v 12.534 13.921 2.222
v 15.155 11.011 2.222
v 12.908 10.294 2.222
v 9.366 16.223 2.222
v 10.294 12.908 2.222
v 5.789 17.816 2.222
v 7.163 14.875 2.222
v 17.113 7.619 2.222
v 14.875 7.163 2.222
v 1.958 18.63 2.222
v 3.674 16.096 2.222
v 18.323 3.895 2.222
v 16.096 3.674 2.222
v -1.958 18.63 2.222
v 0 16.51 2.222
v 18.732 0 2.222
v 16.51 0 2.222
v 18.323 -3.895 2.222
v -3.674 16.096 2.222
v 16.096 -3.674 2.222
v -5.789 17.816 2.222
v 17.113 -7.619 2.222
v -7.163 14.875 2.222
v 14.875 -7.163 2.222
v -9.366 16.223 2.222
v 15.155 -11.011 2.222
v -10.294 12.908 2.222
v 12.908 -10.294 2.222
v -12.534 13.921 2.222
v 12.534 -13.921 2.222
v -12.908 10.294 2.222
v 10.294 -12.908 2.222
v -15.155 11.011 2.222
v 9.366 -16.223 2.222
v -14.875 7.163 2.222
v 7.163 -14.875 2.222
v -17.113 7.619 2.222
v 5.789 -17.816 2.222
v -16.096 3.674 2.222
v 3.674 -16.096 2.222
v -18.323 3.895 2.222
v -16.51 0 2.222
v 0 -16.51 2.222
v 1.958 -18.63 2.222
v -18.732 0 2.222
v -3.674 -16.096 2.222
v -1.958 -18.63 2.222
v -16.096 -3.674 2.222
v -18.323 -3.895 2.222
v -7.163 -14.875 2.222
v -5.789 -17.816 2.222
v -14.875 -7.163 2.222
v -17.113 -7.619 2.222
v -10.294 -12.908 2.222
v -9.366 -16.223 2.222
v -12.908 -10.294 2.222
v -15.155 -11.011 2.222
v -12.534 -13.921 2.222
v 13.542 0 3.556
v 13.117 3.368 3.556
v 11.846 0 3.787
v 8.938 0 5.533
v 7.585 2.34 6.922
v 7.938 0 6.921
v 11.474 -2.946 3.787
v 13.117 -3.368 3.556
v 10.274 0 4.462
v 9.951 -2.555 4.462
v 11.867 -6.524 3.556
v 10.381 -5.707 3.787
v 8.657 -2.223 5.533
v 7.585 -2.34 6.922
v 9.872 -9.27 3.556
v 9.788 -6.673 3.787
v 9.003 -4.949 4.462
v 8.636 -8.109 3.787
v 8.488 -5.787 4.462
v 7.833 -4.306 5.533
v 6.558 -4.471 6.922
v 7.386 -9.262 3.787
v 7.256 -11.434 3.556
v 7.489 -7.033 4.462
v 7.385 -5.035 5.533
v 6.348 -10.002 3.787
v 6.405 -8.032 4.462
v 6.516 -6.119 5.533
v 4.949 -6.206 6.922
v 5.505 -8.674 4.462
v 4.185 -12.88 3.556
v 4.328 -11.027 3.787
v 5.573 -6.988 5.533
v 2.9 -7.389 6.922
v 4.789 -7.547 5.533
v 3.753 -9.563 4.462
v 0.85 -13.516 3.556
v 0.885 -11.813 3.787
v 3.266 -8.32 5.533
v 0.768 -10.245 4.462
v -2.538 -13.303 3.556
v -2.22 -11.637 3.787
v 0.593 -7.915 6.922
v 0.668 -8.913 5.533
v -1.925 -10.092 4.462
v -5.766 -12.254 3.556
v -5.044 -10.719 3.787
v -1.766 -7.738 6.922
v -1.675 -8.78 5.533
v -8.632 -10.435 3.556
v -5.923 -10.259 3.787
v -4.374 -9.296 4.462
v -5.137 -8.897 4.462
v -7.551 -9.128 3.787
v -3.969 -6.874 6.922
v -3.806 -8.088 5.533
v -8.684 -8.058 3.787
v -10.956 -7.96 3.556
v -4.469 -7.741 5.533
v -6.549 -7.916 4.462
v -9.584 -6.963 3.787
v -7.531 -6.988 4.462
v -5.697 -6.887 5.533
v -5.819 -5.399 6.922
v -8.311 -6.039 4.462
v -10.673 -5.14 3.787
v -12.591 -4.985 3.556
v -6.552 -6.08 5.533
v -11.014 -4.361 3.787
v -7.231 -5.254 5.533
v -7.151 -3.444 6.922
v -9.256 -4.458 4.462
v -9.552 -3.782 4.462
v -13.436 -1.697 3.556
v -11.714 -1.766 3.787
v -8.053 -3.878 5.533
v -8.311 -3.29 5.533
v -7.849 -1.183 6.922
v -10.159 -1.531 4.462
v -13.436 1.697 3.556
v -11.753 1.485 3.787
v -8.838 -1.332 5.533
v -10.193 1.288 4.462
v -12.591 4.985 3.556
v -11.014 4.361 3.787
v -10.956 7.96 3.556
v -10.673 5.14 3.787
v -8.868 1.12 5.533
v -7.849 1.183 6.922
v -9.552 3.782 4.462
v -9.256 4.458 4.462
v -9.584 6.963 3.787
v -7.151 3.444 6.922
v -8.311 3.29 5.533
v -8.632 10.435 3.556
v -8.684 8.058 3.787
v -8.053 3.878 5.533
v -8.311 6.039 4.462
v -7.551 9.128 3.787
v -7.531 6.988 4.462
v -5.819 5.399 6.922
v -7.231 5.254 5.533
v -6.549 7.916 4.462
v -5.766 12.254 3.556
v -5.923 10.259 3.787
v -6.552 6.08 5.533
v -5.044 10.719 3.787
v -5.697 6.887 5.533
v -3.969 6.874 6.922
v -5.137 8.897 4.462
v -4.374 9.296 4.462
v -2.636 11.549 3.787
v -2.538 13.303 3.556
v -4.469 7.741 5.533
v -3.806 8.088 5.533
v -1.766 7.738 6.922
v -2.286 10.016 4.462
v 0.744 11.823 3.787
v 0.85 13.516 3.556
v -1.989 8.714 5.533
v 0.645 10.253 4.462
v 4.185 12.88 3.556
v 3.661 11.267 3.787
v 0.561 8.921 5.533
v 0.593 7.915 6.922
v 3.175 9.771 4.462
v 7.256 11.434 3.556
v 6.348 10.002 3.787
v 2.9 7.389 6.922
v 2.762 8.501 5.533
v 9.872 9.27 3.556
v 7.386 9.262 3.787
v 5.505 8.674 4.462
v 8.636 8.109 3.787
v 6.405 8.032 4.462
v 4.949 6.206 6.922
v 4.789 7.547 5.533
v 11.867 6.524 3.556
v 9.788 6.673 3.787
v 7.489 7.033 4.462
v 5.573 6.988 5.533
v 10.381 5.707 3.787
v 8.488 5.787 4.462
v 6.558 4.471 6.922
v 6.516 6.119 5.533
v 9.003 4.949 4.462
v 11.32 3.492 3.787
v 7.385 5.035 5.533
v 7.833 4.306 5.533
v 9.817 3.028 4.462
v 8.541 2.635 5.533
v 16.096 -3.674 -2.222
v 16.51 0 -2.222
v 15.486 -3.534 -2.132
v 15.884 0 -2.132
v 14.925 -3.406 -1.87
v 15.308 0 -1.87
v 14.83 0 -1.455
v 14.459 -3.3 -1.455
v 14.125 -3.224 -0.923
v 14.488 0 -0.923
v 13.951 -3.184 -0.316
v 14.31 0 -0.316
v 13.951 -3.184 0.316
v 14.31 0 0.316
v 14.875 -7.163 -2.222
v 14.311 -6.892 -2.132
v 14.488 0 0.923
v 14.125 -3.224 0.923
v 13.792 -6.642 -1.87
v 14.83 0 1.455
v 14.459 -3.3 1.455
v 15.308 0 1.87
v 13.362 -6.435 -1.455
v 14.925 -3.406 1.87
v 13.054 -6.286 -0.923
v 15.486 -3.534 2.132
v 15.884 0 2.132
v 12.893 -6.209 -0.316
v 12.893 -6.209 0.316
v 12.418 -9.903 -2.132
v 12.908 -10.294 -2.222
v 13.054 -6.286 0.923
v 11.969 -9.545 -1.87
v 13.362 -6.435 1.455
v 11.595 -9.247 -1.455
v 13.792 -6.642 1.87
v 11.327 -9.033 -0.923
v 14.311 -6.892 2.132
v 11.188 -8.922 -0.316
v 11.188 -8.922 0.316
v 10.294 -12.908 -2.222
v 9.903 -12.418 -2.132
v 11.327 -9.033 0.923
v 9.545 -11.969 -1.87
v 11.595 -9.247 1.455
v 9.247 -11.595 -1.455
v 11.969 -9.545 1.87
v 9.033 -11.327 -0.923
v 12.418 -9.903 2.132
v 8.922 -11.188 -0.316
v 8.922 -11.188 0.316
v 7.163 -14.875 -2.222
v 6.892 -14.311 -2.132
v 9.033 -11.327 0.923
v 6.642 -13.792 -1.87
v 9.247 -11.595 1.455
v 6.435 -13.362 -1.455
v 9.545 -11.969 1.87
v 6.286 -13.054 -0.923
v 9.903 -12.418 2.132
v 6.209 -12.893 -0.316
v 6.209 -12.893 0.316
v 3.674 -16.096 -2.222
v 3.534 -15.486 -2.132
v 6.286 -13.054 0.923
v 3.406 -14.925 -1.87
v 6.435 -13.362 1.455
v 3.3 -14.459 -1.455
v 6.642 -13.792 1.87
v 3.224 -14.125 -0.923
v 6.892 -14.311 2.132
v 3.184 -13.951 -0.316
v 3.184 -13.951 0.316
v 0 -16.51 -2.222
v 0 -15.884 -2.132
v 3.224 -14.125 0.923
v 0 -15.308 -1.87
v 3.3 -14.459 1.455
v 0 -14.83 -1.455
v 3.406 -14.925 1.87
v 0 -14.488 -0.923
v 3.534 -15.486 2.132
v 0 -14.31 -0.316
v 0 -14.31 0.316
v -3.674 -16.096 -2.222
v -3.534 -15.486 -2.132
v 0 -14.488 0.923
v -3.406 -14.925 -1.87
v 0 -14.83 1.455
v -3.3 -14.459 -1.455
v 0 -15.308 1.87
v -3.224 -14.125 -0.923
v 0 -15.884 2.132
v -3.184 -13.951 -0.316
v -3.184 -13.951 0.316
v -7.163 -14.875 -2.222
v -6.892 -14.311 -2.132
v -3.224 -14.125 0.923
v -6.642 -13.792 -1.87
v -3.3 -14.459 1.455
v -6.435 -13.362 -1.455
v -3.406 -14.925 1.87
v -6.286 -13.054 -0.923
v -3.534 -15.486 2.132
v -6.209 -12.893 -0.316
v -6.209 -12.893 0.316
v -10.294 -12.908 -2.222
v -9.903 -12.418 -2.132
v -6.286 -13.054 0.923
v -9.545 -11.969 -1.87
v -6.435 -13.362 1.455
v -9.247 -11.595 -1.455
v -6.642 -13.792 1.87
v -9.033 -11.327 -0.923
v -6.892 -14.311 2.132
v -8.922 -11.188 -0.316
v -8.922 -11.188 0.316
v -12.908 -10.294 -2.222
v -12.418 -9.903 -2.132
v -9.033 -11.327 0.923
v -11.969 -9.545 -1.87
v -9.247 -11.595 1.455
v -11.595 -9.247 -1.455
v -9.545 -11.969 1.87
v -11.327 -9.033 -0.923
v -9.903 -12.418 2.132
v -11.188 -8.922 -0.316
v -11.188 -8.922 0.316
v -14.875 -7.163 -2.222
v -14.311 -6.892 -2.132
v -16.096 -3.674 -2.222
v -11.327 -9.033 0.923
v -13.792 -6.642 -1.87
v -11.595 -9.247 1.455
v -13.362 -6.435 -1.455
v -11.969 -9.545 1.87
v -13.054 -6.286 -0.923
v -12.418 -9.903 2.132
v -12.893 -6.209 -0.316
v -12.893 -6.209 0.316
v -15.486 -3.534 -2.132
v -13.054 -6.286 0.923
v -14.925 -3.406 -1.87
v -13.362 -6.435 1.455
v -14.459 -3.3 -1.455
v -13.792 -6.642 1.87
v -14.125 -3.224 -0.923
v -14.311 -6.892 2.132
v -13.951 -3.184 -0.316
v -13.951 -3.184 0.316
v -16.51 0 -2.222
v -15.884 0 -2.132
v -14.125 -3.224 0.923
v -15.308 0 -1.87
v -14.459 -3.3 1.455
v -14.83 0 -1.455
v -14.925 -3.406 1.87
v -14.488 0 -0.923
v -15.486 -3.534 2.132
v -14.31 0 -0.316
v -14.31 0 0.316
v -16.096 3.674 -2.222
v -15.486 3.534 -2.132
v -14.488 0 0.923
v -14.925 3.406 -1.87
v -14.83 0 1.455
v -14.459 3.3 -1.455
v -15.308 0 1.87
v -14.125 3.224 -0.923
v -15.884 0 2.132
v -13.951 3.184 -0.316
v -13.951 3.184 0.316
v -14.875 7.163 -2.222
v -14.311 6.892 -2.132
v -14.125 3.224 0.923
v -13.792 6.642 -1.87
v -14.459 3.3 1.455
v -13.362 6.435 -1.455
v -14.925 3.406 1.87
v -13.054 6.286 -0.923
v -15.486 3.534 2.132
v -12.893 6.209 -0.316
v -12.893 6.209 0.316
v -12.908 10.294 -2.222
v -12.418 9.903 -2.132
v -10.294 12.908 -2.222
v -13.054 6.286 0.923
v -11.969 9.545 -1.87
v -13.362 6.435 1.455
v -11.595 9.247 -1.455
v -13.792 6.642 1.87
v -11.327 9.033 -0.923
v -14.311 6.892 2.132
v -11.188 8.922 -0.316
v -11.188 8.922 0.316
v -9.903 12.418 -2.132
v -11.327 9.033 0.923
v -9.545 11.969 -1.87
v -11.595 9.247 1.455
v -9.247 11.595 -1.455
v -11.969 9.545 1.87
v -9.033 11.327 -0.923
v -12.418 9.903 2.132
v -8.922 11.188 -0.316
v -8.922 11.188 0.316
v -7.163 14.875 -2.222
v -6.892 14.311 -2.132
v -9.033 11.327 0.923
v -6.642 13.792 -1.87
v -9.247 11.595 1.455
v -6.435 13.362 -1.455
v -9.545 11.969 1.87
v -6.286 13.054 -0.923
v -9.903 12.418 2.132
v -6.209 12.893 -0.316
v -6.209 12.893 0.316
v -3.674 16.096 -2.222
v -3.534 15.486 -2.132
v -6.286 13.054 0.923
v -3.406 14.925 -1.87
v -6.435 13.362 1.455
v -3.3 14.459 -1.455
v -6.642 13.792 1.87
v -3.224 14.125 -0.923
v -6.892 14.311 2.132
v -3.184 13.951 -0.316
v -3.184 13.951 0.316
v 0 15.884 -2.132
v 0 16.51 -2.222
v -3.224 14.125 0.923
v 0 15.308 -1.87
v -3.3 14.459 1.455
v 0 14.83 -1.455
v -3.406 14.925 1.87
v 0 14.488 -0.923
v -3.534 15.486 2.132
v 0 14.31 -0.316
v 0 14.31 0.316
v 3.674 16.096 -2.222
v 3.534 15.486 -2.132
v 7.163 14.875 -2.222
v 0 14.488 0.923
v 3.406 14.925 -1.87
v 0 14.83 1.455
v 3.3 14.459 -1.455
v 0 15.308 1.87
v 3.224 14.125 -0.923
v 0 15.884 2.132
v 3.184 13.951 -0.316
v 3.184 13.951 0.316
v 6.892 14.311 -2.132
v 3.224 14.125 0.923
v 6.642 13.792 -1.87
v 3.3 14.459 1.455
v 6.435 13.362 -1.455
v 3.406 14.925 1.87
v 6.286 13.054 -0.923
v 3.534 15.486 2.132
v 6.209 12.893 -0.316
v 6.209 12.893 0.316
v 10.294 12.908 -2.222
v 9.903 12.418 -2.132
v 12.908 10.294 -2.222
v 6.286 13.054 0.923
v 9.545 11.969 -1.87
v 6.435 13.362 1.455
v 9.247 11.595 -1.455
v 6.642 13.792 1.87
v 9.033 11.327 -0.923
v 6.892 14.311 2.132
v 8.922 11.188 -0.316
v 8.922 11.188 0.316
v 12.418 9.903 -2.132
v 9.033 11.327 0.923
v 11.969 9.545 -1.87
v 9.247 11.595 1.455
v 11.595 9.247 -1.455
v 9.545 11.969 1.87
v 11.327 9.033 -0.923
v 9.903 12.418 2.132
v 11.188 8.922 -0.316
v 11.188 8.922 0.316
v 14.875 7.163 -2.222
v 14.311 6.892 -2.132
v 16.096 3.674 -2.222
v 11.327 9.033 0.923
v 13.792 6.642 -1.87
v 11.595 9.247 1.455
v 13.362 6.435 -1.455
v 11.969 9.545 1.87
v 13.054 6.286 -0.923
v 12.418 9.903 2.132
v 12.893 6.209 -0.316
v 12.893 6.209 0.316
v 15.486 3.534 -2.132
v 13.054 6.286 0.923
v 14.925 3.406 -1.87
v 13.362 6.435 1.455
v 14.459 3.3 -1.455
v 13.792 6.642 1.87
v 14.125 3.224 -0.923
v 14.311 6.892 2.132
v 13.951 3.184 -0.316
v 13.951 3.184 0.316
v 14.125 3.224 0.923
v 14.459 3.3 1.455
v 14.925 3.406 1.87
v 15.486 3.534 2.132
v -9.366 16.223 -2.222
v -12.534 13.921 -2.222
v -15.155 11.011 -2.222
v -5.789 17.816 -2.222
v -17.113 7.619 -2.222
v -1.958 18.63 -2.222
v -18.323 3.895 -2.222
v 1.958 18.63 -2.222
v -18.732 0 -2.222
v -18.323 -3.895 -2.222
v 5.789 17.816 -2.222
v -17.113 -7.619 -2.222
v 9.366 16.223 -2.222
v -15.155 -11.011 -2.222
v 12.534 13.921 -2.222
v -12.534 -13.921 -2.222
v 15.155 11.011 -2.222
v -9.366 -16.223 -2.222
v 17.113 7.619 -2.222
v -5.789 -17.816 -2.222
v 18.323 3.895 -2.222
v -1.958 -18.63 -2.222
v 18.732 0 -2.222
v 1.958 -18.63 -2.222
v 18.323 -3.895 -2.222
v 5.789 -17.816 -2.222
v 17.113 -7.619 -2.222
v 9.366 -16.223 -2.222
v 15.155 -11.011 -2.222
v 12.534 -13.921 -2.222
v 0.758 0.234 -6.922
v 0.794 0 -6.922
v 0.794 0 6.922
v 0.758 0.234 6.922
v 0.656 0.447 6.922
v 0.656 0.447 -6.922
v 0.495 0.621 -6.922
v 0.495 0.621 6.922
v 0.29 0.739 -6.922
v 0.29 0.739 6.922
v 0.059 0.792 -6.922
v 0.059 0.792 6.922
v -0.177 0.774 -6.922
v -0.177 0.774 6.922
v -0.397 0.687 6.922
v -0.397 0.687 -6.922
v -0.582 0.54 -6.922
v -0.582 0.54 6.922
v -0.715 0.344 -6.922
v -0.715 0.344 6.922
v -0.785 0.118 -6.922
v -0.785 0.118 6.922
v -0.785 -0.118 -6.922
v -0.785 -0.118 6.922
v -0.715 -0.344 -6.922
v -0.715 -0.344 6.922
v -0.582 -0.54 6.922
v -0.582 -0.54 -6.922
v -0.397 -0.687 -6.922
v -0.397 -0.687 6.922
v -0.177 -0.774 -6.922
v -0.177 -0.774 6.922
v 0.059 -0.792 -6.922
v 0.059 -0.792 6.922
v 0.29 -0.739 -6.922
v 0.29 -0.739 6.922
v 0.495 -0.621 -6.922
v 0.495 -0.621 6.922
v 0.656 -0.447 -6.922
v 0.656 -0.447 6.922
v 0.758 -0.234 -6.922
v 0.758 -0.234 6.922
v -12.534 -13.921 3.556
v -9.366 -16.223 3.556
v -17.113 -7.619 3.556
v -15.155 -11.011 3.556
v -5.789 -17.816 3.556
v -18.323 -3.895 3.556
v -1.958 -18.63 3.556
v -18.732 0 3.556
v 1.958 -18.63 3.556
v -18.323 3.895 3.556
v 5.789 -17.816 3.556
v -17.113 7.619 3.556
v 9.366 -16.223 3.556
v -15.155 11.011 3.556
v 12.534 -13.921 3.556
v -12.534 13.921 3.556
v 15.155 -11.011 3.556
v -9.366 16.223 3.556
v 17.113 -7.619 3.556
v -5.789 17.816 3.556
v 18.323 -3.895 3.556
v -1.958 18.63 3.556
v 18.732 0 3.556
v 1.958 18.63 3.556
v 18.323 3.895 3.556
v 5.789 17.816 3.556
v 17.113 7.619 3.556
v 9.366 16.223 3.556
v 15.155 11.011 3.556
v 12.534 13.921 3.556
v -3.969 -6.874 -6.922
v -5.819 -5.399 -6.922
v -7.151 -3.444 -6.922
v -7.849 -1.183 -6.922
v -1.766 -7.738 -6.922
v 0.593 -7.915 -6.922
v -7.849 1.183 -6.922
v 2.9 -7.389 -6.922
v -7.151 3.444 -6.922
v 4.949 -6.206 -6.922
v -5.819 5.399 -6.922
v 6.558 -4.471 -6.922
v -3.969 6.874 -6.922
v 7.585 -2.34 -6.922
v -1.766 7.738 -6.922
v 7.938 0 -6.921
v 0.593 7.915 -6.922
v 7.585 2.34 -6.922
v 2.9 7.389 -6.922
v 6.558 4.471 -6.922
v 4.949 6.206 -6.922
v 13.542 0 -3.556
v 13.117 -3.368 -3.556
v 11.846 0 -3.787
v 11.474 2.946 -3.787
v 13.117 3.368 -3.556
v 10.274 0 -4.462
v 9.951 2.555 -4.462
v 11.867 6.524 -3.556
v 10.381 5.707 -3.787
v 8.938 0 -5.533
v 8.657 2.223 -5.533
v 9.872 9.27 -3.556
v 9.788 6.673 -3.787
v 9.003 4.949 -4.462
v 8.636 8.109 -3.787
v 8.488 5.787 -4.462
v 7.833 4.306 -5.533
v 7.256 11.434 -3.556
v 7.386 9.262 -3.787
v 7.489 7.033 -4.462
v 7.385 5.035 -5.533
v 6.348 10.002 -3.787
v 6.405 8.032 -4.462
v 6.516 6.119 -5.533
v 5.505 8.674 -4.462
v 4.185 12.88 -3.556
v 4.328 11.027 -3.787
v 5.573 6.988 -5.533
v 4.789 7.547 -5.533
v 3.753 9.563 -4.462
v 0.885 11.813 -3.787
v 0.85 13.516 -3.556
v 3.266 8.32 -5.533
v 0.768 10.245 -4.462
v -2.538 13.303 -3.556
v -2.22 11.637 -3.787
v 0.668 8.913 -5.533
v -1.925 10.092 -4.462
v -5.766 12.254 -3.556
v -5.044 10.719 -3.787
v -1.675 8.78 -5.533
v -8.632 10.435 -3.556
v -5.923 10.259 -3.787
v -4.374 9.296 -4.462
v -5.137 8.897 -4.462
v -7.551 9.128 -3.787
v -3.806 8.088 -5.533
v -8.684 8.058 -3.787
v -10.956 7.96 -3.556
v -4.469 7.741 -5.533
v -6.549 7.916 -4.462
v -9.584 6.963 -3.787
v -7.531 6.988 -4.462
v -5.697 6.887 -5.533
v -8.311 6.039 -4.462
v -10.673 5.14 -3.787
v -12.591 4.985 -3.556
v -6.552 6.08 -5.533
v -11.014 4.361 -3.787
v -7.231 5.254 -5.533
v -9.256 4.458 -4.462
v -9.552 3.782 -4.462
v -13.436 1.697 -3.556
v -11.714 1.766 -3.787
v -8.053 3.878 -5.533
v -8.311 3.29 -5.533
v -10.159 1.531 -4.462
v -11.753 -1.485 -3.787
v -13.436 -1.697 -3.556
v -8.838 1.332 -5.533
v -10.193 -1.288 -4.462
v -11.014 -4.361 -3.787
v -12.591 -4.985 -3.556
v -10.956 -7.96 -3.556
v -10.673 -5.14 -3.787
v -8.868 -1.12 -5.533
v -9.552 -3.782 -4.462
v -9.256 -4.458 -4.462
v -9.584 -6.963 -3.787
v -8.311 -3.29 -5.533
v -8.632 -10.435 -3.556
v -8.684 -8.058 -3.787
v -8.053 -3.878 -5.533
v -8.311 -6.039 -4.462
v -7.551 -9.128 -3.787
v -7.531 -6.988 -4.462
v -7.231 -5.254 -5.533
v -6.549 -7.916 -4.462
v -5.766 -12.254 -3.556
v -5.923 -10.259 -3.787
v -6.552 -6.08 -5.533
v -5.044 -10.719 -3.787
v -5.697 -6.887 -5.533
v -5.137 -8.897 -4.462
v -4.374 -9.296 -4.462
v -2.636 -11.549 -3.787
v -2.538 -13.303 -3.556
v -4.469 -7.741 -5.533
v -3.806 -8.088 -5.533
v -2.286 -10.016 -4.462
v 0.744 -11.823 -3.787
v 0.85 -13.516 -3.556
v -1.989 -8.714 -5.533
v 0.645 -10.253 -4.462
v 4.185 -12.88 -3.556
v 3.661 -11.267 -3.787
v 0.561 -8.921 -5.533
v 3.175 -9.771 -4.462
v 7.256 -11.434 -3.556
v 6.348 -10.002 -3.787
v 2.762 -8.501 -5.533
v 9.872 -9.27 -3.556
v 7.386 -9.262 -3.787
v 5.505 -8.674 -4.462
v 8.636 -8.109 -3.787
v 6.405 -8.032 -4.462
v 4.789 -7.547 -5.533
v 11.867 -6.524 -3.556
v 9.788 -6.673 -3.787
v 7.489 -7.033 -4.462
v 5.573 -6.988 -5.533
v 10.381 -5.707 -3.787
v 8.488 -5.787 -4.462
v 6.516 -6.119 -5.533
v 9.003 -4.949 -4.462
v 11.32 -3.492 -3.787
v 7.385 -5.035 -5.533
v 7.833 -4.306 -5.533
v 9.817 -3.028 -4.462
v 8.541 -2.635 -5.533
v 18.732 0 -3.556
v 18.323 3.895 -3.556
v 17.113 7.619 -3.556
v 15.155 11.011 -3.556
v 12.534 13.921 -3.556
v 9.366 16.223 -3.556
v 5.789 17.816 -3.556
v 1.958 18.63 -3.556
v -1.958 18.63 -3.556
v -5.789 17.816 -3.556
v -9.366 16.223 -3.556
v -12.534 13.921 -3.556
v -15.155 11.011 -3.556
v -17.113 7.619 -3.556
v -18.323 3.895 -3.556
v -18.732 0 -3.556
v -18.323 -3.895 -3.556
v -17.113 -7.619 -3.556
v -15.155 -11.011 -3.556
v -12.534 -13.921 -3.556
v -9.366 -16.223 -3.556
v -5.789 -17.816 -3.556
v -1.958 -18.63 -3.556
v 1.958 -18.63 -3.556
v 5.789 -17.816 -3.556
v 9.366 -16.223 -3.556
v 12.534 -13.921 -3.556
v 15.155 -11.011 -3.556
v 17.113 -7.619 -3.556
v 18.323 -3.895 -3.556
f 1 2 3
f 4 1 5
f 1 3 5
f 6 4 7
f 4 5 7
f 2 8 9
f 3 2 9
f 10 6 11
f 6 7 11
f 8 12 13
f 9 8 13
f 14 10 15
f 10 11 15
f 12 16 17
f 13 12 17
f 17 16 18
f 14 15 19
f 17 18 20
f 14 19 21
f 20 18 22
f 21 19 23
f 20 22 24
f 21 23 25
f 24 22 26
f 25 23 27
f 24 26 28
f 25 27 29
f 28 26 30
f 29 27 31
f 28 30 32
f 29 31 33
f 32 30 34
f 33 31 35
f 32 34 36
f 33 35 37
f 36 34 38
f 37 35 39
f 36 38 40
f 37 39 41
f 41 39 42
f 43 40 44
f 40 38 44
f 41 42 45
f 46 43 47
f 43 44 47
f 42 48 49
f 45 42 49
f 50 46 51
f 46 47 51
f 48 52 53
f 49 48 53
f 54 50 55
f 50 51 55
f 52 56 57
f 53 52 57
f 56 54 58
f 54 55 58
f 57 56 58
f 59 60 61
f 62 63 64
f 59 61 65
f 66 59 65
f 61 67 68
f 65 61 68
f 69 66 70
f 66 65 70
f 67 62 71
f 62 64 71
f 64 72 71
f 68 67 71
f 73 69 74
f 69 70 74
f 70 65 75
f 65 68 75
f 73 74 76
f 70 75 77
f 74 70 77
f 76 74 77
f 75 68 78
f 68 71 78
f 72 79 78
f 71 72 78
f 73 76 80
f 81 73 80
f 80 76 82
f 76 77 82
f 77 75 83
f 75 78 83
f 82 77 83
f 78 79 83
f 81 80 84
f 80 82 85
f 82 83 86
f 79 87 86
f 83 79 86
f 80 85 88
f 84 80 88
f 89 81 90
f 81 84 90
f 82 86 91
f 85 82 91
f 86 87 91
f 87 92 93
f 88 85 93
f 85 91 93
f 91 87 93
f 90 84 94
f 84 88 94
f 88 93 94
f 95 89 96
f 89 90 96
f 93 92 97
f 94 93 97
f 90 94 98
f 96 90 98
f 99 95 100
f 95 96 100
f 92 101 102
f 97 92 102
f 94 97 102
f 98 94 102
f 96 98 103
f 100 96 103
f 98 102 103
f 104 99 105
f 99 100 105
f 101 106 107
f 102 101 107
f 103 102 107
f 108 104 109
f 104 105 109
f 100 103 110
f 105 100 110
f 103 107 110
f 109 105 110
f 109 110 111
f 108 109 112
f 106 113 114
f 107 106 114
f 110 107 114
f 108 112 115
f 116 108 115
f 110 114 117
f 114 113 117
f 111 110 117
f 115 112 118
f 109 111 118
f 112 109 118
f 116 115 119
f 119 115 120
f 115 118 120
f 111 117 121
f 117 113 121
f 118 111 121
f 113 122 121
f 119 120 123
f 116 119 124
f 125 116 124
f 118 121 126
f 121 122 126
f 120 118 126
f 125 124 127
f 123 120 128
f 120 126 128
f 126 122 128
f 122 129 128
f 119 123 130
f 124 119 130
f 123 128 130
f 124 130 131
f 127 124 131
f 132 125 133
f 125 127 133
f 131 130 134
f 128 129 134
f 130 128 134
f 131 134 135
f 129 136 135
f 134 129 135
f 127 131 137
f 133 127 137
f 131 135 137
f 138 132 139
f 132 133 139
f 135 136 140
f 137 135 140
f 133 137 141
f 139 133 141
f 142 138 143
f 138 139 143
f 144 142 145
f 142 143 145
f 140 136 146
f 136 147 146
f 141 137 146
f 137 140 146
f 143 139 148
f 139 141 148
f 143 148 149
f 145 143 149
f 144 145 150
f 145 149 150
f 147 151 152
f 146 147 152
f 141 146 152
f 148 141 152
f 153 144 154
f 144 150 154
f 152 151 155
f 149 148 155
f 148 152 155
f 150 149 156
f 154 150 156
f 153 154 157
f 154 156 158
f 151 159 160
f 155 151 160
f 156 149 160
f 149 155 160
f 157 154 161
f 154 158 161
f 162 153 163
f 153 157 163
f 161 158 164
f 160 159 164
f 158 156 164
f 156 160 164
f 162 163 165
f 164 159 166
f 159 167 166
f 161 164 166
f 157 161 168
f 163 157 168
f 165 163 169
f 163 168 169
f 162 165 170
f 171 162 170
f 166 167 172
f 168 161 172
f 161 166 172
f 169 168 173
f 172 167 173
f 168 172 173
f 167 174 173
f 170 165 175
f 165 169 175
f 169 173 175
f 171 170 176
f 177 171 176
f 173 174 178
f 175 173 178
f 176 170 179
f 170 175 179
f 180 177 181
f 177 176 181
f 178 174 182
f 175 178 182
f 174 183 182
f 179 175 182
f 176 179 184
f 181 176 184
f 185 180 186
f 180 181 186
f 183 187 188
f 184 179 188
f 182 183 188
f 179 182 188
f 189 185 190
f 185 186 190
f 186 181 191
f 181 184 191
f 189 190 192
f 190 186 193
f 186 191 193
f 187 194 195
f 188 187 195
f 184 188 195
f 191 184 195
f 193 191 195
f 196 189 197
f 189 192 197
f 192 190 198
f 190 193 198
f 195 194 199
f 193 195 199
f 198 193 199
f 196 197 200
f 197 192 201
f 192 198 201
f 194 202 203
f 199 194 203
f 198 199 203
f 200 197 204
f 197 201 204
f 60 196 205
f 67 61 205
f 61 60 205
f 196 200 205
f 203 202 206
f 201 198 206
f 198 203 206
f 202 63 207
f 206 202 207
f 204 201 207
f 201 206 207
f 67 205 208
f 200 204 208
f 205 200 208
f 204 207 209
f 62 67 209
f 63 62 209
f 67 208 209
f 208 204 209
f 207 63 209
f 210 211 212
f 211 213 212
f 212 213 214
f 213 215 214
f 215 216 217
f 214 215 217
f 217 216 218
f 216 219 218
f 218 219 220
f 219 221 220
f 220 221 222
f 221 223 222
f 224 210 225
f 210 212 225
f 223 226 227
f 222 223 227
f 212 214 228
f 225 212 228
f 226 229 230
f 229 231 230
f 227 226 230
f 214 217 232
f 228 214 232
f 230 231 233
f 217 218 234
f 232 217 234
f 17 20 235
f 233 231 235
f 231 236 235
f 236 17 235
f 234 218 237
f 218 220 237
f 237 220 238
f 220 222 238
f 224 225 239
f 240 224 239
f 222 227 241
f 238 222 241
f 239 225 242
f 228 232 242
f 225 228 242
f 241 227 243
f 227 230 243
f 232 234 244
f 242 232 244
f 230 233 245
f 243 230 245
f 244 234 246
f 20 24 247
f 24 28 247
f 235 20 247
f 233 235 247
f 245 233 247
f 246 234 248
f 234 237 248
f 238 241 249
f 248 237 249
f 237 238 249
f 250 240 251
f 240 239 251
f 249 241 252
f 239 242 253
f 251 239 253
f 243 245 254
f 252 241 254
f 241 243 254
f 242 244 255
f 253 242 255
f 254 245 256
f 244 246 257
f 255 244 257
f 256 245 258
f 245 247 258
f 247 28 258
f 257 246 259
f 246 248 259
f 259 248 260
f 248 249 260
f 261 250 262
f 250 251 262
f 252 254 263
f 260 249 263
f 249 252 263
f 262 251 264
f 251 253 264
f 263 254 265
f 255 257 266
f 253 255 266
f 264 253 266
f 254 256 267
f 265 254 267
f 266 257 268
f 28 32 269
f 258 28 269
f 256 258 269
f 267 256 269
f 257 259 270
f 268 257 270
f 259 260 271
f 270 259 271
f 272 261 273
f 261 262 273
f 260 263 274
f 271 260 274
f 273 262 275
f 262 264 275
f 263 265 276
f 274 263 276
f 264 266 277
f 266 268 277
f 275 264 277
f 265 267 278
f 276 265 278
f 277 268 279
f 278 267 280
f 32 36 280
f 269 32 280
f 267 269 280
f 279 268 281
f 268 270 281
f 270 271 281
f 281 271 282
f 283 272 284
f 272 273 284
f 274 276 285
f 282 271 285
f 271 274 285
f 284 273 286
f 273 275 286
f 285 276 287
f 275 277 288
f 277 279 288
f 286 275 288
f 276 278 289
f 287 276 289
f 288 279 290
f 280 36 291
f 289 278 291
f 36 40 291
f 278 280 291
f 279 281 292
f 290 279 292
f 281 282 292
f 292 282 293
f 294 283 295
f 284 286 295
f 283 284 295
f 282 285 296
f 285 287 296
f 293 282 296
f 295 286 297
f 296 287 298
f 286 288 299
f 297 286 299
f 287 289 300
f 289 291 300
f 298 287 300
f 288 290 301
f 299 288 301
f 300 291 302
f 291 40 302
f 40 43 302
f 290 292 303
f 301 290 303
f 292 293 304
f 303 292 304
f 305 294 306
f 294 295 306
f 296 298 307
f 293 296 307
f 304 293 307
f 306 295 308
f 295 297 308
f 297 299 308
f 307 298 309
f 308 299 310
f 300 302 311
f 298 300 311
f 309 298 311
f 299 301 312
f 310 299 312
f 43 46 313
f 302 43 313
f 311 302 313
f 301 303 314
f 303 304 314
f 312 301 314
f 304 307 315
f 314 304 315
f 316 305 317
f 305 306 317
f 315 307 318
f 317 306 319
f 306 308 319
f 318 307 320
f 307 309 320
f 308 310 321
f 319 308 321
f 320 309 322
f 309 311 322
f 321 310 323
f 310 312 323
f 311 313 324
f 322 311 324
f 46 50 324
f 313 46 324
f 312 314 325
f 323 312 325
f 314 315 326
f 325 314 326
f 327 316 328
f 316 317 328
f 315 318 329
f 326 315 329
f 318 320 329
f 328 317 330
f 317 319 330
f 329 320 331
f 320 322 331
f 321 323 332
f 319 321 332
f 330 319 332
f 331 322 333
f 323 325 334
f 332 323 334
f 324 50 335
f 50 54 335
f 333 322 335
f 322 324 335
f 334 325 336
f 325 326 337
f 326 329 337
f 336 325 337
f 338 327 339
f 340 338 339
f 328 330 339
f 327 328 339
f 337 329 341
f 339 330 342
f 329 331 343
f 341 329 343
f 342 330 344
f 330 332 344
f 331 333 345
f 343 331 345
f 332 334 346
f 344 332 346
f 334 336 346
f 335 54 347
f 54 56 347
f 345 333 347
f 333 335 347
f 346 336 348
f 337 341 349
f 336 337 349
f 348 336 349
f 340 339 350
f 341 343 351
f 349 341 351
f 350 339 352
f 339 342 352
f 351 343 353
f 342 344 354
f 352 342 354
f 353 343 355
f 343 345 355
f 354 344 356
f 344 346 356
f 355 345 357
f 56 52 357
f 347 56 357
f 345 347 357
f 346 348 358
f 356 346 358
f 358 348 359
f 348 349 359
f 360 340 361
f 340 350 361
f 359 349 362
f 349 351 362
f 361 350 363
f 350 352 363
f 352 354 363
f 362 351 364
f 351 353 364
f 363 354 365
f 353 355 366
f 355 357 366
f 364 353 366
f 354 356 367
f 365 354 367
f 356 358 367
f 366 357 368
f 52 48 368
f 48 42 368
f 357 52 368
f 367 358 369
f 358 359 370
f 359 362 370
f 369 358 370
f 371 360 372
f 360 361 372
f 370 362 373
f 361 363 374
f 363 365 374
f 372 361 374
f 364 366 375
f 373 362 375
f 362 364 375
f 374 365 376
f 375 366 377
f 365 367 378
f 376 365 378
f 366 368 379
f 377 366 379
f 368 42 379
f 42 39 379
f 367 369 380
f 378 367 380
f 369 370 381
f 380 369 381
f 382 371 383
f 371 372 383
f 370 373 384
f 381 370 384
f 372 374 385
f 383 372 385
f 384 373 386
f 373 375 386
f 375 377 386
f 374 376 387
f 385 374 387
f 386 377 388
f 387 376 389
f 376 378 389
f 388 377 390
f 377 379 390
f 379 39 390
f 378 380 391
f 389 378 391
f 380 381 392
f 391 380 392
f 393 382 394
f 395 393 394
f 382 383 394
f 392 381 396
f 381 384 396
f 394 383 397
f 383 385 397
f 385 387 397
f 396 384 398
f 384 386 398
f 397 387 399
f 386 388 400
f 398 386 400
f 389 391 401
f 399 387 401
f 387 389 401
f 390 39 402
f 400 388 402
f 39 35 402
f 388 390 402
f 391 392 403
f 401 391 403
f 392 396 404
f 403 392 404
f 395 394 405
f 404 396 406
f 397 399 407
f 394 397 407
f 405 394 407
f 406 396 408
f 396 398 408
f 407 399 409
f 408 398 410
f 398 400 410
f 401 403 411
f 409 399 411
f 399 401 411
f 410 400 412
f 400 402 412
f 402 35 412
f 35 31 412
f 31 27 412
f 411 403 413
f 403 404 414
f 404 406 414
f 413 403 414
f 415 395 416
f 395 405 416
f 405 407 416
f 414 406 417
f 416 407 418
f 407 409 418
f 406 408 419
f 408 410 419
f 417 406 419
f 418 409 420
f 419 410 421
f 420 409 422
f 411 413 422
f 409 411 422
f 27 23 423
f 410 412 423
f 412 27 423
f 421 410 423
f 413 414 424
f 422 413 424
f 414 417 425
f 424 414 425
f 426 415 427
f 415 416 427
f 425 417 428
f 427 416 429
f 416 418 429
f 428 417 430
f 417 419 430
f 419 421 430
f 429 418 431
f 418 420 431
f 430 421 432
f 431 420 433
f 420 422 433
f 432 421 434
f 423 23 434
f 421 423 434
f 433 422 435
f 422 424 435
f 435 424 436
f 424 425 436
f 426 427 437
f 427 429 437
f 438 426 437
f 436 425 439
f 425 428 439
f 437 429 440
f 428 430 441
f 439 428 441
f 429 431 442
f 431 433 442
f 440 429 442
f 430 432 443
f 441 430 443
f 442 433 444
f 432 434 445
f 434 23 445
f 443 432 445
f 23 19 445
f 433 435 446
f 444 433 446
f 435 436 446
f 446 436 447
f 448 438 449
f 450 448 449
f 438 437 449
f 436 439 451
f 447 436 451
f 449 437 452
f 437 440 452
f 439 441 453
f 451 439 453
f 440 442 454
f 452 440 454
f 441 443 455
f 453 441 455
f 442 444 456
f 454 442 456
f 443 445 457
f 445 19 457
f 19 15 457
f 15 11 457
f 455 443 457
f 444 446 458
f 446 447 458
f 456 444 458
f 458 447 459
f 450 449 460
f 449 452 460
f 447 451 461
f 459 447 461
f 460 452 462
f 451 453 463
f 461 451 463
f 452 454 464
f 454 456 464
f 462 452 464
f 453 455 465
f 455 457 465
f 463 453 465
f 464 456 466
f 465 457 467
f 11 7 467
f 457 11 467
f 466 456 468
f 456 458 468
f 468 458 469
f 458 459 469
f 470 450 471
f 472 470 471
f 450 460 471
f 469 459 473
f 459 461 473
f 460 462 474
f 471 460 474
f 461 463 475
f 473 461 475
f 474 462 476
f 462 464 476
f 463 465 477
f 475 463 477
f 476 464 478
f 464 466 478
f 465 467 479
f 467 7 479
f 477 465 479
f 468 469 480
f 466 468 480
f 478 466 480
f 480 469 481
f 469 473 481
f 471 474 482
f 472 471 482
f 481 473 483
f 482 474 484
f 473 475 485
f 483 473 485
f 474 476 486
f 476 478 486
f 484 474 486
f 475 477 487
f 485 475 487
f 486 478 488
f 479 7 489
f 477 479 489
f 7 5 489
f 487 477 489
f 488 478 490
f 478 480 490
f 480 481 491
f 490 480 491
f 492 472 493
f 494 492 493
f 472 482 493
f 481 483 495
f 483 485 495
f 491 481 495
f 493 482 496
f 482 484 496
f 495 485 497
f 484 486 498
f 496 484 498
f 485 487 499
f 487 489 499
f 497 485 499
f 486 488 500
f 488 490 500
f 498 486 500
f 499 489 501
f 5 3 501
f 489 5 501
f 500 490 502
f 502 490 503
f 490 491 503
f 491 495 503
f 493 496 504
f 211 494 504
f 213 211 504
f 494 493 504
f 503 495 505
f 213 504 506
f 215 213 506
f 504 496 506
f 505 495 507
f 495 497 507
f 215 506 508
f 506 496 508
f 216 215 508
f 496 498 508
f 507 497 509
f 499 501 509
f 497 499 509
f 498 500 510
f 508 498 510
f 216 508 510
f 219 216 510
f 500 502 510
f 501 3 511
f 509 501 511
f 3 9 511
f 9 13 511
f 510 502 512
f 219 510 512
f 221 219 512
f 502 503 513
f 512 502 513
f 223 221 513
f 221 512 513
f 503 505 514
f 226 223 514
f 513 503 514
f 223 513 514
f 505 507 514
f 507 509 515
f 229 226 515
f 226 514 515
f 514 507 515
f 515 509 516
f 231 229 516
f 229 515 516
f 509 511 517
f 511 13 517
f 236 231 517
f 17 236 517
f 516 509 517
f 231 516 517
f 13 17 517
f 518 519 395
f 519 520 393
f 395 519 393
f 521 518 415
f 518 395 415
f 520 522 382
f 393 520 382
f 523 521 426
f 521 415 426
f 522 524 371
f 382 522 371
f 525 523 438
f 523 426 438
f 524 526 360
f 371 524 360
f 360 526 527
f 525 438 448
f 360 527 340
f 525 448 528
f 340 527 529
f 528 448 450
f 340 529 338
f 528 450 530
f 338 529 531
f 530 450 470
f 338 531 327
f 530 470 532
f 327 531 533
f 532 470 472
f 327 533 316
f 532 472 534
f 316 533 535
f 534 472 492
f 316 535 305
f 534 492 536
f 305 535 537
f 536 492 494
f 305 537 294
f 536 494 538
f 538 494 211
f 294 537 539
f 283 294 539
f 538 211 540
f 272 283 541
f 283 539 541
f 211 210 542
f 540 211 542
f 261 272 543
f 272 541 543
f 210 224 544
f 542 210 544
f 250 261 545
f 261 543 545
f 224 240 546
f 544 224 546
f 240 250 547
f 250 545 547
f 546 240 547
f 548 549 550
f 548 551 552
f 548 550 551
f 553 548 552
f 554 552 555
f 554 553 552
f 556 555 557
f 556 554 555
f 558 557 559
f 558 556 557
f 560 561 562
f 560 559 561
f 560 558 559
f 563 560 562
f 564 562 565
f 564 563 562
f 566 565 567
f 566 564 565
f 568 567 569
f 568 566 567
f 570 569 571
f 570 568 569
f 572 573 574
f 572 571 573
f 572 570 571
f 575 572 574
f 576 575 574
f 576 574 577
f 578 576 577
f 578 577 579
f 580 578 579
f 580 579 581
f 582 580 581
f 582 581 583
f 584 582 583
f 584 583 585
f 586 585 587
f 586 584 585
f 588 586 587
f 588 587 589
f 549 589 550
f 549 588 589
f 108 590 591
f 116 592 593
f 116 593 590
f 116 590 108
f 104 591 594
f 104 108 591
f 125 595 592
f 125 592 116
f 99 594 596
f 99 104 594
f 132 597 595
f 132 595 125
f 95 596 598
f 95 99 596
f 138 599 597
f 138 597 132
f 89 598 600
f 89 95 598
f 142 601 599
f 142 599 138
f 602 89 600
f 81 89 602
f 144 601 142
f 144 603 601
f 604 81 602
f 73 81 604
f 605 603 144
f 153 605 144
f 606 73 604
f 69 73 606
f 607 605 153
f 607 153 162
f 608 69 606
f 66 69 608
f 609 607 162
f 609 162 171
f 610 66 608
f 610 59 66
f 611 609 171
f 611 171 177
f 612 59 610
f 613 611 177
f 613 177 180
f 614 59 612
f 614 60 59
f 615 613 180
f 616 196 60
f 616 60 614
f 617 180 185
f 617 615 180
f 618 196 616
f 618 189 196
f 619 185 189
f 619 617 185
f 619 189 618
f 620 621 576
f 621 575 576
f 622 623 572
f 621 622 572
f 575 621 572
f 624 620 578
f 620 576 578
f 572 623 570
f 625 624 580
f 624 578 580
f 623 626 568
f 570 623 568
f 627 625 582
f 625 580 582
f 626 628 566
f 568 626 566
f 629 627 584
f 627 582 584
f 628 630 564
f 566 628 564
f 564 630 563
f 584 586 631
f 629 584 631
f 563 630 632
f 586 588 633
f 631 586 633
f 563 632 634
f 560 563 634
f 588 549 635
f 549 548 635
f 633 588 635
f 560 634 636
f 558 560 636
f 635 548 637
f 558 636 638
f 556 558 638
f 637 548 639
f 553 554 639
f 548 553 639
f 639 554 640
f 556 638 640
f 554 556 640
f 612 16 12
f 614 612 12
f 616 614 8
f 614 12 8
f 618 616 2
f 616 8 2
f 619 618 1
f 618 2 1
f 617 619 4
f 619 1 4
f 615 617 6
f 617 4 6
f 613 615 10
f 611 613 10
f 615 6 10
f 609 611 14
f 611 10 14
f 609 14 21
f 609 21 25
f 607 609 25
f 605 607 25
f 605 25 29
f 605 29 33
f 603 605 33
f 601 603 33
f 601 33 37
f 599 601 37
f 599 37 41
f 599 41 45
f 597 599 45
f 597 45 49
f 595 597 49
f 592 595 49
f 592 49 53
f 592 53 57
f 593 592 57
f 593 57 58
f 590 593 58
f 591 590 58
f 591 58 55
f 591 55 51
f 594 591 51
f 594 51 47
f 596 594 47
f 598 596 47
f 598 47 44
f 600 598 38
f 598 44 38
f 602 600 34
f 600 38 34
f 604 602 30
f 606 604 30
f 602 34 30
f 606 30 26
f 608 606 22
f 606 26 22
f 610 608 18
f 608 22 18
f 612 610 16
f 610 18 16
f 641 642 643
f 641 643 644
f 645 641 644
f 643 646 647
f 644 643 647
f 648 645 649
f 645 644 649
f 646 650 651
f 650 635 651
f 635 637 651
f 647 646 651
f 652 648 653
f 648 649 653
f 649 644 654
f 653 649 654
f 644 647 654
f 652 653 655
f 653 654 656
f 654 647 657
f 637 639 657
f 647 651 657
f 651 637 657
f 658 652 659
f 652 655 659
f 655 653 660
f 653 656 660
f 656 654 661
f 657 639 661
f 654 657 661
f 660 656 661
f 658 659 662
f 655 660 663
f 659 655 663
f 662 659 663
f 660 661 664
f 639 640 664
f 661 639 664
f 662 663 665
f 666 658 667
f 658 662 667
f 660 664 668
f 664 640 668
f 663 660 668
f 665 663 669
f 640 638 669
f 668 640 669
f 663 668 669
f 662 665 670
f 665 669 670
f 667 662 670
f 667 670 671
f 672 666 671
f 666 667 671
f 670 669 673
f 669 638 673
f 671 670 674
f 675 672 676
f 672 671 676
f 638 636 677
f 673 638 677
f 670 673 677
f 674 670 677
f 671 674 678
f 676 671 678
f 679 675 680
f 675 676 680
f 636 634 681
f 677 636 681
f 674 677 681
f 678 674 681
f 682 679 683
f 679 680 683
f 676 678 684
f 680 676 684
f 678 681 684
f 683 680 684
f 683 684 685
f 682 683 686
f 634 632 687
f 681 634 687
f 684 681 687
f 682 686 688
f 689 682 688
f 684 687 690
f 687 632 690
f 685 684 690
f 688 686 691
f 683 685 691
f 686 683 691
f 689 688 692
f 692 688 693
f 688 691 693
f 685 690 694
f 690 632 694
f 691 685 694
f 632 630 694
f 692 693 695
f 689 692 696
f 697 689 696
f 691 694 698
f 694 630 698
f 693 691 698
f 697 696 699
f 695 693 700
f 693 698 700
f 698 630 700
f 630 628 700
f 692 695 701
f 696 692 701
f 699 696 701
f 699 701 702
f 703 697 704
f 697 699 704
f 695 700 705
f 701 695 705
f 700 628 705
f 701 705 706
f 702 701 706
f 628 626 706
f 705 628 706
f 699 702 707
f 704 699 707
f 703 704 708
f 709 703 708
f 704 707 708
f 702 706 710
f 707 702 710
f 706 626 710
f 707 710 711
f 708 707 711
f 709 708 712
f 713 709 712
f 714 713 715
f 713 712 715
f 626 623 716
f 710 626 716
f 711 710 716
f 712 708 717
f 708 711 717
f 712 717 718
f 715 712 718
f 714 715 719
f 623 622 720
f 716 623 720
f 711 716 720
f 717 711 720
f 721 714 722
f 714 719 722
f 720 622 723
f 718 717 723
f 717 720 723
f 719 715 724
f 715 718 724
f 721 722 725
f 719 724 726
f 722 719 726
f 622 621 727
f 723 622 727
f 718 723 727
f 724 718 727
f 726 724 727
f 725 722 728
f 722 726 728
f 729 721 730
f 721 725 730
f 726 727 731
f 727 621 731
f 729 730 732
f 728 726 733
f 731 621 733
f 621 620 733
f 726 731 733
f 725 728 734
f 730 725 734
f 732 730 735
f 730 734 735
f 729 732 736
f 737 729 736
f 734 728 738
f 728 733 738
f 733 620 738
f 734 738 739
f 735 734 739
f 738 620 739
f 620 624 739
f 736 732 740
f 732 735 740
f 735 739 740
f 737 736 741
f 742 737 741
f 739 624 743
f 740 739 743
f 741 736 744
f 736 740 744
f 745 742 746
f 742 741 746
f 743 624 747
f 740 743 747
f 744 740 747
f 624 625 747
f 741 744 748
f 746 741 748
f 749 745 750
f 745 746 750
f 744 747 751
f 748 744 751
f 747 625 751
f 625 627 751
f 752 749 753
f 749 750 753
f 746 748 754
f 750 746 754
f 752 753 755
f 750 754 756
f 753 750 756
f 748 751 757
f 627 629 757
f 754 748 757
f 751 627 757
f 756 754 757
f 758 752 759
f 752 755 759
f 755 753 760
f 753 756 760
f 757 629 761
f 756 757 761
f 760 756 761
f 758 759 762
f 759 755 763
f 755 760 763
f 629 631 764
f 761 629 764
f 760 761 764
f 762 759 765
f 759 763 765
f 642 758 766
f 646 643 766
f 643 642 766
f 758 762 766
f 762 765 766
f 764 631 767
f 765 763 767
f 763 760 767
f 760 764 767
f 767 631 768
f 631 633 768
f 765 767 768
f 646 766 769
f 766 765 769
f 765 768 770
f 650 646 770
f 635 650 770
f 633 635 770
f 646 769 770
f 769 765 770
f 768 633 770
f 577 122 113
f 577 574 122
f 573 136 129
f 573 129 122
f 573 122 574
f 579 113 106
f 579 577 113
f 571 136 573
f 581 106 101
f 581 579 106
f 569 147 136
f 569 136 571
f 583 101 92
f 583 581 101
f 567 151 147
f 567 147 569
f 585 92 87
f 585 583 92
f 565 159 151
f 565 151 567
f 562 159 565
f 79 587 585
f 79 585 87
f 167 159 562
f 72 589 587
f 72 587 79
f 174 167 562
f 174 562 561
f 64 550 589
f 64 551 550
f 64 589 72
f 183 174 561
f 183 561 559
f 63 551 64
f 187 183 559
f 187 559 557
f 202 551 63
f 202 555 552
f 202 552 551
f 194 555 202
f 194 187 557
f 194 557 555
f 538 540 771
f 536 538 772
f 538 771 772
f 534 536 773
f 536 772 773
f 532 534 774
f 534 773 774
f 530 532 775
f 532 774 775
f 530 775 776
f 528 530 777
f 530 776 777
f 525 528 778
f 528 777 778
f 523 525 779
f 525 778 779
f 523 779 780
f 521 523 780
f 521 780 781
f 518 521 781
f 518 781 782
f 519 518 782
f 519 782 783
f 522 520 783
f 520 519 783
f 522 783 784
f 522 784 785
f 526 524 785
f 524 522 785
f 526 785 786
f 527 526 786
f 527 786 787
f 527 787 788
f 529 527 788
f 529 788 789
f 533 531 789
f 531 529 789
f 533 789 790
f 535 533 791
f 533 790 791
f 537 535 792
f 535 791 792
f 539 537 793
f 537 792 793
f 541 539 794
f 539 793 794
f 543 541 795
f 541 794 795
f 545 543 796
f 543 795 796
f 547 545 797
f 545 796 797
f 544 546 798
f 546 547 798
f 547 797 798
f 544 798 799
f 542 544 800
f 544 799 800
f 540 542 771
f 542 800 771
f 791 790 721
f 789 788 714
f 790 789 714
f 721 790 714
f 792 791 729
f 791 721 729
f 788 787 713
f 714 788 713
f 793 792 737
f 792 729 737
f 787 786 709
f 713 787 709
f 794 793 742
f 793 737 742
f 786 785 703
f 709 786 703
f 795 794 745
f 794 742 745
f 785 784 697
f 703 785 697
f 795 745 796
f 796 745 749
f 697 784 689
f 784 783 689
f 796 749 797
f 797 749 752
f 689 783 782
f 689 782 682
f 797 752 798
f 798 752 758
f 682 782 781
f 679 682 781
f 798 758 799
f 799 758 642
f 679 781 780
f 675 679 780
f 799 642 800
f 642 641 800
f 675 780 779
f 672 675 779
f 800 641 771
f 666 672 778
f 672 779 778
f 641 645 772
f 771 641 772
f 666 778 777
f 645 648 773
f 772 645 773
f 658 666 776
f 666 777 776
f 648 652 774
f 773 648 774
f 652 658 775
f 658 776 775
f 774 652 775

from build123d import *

# Parameters (mm, degrees)
BOSS_EXTRUDE1_DEPTH      = 3.556
BOSS_EXTRUDE1_DEPTH_BACK = 3.556
SKETCH2_R                = 18.7325
BOSS_EXTRUDE2_DEPTH      = 6.9215
BOSS_EXTRUDE2_DEPTH_BACK = 6.9215
SKETCH4_R                = 7.9375
FILLET1_R                = 6.35
CUT_EXTRUDE1_DEPTH       = 30.890496174
CUT_EXTRUDE1_DEPTH_BACK  = 30.890496174
SKETCH5_R                = 0.79375


with BuildPart() as part:
    # Sketch2 → Boss-Extrude1 (new, two sides: drawn at the far end of the back side and taken through both)
    with BuildSketch(Plane.XY.offset(-BOSS_EXTRUDE1_DEPTH_BACK)):
        Circle(SKETCH2_R)
    extrude(amount=BOSS_EXTRUDE1_DEPTH + BOSS_EXTRUDE1_DEPTH_BACK)

    # Sketch3 → Cut-Revolve1 (revolve, cut)
    with BuildSketch(Plane(origin=(0, 0, 0), x_dir=(0, 0, -1), z_dir=(1, 0, 0)), mode=Mode.PRIVATE) as cut_revolve1_sk:
        with BuildLine():
            Line((-2.2225, 16.51), (-2.2225, 20.955))
            Line((-2.2225, 20.955), (2.2225, 20.955))
            Line((2.2225, 20.955), (2.2225, 16.51))
            ThreePointArc((2.2225, 16.51), (0, 14.2875), (-2.2225, 16.51))
        make_face()
    revolve(cut_revolve1_sk.sketch.rotate(Axis((0, 0, 3.556), (0, 0, -1)), 90), axis=Axis((0, 0, 3.556), (0, 0, -1)), mode=Mode.SUBTRACT)

    # Sketch4 → Boss-Extrude2 (add, two sides: drawn at the far end of the back side and taken through both)
    with BuildSketch(Plane.XY.offset(-BOSS_EXTRUDE2_DEPTH_BACK)):
        Circle(SKETCH4_R)
    extrude(amount=BOSS_EXTRUDE2_DEPTH + BOSS_EXTRUDE2_DEPTH_BACK)

    # Fillet1
    # the kernel refuses this fillet: 6.35 mm, written as the material it adds along each edge
    with BuildSketch(Plane(origin=(0, 0, 3.556), x_dir=(1, 0, 0), z_dir=(0, 1, 0))) as fillet1_piece_1:
        with BuildLine():
            CenterArc((13.542431735, -6.35), FILLET1_R, 90, 61.965703465)
            Line((7.9375, -3.3655), (7.825401365, -3.30581))
            ThreePointArc((7.825401365, -3.30581), (7.8105, -1.68275), (7.8105, 0))
            Line((7.8105, 0), (7.9375, 0.127))
            Line((7.9375, 0.127), (13.542431735, 0.127))
            Line((13.542431735, 0.127), (13.542431735, 0))
        make_face()
    revolve(axis=Axis((0, 0, 3.556), (0, 0, -1)))
    with BuildSketch(Plane(origin=(0, 0, -3.556), x_dir=(1, 0, 0), z_dir=(0, -1, 0))) as fillet1_piece_2:
        with BuildLine():
            CenterArc((13.542431735, -6.35), FILLET1_R, 90, 61.965703465)
            Line((7.9375, -3.3655), (7.825401365, -3.30581))
            ThreePointArc((7.825401365, -3.30581), (7.8105, -1.68275), (7.8105, 0))
            Line((7.8105, 0), (7.9375, 0.127))
            Line((7.9375, 0.127), (13.542431735, 0.127))
            Line((13.542431735, 0.127), (13.542431735, 0))
        make_face()
    revolve(axis=Axis((0, 0, -3.556), (0, 0, 1)))

    # Sketch5 → Cut-Extrude1 (cut, two sides: drawn at the far end of the back side and taken through both)
    with BuildSketch(Plane.XY.offset(6.9215).offset(-CUT_EXTRUDE1_DEPTH_BACK)):
        Circle(SKETCH5_R)
    extrude(amount=CUT_EXTRUDE1_DEPTH + CUT_EXTRUDE1_DEPTH_BACK, mode=Mode.SUBTRACT)


solid = part.part
